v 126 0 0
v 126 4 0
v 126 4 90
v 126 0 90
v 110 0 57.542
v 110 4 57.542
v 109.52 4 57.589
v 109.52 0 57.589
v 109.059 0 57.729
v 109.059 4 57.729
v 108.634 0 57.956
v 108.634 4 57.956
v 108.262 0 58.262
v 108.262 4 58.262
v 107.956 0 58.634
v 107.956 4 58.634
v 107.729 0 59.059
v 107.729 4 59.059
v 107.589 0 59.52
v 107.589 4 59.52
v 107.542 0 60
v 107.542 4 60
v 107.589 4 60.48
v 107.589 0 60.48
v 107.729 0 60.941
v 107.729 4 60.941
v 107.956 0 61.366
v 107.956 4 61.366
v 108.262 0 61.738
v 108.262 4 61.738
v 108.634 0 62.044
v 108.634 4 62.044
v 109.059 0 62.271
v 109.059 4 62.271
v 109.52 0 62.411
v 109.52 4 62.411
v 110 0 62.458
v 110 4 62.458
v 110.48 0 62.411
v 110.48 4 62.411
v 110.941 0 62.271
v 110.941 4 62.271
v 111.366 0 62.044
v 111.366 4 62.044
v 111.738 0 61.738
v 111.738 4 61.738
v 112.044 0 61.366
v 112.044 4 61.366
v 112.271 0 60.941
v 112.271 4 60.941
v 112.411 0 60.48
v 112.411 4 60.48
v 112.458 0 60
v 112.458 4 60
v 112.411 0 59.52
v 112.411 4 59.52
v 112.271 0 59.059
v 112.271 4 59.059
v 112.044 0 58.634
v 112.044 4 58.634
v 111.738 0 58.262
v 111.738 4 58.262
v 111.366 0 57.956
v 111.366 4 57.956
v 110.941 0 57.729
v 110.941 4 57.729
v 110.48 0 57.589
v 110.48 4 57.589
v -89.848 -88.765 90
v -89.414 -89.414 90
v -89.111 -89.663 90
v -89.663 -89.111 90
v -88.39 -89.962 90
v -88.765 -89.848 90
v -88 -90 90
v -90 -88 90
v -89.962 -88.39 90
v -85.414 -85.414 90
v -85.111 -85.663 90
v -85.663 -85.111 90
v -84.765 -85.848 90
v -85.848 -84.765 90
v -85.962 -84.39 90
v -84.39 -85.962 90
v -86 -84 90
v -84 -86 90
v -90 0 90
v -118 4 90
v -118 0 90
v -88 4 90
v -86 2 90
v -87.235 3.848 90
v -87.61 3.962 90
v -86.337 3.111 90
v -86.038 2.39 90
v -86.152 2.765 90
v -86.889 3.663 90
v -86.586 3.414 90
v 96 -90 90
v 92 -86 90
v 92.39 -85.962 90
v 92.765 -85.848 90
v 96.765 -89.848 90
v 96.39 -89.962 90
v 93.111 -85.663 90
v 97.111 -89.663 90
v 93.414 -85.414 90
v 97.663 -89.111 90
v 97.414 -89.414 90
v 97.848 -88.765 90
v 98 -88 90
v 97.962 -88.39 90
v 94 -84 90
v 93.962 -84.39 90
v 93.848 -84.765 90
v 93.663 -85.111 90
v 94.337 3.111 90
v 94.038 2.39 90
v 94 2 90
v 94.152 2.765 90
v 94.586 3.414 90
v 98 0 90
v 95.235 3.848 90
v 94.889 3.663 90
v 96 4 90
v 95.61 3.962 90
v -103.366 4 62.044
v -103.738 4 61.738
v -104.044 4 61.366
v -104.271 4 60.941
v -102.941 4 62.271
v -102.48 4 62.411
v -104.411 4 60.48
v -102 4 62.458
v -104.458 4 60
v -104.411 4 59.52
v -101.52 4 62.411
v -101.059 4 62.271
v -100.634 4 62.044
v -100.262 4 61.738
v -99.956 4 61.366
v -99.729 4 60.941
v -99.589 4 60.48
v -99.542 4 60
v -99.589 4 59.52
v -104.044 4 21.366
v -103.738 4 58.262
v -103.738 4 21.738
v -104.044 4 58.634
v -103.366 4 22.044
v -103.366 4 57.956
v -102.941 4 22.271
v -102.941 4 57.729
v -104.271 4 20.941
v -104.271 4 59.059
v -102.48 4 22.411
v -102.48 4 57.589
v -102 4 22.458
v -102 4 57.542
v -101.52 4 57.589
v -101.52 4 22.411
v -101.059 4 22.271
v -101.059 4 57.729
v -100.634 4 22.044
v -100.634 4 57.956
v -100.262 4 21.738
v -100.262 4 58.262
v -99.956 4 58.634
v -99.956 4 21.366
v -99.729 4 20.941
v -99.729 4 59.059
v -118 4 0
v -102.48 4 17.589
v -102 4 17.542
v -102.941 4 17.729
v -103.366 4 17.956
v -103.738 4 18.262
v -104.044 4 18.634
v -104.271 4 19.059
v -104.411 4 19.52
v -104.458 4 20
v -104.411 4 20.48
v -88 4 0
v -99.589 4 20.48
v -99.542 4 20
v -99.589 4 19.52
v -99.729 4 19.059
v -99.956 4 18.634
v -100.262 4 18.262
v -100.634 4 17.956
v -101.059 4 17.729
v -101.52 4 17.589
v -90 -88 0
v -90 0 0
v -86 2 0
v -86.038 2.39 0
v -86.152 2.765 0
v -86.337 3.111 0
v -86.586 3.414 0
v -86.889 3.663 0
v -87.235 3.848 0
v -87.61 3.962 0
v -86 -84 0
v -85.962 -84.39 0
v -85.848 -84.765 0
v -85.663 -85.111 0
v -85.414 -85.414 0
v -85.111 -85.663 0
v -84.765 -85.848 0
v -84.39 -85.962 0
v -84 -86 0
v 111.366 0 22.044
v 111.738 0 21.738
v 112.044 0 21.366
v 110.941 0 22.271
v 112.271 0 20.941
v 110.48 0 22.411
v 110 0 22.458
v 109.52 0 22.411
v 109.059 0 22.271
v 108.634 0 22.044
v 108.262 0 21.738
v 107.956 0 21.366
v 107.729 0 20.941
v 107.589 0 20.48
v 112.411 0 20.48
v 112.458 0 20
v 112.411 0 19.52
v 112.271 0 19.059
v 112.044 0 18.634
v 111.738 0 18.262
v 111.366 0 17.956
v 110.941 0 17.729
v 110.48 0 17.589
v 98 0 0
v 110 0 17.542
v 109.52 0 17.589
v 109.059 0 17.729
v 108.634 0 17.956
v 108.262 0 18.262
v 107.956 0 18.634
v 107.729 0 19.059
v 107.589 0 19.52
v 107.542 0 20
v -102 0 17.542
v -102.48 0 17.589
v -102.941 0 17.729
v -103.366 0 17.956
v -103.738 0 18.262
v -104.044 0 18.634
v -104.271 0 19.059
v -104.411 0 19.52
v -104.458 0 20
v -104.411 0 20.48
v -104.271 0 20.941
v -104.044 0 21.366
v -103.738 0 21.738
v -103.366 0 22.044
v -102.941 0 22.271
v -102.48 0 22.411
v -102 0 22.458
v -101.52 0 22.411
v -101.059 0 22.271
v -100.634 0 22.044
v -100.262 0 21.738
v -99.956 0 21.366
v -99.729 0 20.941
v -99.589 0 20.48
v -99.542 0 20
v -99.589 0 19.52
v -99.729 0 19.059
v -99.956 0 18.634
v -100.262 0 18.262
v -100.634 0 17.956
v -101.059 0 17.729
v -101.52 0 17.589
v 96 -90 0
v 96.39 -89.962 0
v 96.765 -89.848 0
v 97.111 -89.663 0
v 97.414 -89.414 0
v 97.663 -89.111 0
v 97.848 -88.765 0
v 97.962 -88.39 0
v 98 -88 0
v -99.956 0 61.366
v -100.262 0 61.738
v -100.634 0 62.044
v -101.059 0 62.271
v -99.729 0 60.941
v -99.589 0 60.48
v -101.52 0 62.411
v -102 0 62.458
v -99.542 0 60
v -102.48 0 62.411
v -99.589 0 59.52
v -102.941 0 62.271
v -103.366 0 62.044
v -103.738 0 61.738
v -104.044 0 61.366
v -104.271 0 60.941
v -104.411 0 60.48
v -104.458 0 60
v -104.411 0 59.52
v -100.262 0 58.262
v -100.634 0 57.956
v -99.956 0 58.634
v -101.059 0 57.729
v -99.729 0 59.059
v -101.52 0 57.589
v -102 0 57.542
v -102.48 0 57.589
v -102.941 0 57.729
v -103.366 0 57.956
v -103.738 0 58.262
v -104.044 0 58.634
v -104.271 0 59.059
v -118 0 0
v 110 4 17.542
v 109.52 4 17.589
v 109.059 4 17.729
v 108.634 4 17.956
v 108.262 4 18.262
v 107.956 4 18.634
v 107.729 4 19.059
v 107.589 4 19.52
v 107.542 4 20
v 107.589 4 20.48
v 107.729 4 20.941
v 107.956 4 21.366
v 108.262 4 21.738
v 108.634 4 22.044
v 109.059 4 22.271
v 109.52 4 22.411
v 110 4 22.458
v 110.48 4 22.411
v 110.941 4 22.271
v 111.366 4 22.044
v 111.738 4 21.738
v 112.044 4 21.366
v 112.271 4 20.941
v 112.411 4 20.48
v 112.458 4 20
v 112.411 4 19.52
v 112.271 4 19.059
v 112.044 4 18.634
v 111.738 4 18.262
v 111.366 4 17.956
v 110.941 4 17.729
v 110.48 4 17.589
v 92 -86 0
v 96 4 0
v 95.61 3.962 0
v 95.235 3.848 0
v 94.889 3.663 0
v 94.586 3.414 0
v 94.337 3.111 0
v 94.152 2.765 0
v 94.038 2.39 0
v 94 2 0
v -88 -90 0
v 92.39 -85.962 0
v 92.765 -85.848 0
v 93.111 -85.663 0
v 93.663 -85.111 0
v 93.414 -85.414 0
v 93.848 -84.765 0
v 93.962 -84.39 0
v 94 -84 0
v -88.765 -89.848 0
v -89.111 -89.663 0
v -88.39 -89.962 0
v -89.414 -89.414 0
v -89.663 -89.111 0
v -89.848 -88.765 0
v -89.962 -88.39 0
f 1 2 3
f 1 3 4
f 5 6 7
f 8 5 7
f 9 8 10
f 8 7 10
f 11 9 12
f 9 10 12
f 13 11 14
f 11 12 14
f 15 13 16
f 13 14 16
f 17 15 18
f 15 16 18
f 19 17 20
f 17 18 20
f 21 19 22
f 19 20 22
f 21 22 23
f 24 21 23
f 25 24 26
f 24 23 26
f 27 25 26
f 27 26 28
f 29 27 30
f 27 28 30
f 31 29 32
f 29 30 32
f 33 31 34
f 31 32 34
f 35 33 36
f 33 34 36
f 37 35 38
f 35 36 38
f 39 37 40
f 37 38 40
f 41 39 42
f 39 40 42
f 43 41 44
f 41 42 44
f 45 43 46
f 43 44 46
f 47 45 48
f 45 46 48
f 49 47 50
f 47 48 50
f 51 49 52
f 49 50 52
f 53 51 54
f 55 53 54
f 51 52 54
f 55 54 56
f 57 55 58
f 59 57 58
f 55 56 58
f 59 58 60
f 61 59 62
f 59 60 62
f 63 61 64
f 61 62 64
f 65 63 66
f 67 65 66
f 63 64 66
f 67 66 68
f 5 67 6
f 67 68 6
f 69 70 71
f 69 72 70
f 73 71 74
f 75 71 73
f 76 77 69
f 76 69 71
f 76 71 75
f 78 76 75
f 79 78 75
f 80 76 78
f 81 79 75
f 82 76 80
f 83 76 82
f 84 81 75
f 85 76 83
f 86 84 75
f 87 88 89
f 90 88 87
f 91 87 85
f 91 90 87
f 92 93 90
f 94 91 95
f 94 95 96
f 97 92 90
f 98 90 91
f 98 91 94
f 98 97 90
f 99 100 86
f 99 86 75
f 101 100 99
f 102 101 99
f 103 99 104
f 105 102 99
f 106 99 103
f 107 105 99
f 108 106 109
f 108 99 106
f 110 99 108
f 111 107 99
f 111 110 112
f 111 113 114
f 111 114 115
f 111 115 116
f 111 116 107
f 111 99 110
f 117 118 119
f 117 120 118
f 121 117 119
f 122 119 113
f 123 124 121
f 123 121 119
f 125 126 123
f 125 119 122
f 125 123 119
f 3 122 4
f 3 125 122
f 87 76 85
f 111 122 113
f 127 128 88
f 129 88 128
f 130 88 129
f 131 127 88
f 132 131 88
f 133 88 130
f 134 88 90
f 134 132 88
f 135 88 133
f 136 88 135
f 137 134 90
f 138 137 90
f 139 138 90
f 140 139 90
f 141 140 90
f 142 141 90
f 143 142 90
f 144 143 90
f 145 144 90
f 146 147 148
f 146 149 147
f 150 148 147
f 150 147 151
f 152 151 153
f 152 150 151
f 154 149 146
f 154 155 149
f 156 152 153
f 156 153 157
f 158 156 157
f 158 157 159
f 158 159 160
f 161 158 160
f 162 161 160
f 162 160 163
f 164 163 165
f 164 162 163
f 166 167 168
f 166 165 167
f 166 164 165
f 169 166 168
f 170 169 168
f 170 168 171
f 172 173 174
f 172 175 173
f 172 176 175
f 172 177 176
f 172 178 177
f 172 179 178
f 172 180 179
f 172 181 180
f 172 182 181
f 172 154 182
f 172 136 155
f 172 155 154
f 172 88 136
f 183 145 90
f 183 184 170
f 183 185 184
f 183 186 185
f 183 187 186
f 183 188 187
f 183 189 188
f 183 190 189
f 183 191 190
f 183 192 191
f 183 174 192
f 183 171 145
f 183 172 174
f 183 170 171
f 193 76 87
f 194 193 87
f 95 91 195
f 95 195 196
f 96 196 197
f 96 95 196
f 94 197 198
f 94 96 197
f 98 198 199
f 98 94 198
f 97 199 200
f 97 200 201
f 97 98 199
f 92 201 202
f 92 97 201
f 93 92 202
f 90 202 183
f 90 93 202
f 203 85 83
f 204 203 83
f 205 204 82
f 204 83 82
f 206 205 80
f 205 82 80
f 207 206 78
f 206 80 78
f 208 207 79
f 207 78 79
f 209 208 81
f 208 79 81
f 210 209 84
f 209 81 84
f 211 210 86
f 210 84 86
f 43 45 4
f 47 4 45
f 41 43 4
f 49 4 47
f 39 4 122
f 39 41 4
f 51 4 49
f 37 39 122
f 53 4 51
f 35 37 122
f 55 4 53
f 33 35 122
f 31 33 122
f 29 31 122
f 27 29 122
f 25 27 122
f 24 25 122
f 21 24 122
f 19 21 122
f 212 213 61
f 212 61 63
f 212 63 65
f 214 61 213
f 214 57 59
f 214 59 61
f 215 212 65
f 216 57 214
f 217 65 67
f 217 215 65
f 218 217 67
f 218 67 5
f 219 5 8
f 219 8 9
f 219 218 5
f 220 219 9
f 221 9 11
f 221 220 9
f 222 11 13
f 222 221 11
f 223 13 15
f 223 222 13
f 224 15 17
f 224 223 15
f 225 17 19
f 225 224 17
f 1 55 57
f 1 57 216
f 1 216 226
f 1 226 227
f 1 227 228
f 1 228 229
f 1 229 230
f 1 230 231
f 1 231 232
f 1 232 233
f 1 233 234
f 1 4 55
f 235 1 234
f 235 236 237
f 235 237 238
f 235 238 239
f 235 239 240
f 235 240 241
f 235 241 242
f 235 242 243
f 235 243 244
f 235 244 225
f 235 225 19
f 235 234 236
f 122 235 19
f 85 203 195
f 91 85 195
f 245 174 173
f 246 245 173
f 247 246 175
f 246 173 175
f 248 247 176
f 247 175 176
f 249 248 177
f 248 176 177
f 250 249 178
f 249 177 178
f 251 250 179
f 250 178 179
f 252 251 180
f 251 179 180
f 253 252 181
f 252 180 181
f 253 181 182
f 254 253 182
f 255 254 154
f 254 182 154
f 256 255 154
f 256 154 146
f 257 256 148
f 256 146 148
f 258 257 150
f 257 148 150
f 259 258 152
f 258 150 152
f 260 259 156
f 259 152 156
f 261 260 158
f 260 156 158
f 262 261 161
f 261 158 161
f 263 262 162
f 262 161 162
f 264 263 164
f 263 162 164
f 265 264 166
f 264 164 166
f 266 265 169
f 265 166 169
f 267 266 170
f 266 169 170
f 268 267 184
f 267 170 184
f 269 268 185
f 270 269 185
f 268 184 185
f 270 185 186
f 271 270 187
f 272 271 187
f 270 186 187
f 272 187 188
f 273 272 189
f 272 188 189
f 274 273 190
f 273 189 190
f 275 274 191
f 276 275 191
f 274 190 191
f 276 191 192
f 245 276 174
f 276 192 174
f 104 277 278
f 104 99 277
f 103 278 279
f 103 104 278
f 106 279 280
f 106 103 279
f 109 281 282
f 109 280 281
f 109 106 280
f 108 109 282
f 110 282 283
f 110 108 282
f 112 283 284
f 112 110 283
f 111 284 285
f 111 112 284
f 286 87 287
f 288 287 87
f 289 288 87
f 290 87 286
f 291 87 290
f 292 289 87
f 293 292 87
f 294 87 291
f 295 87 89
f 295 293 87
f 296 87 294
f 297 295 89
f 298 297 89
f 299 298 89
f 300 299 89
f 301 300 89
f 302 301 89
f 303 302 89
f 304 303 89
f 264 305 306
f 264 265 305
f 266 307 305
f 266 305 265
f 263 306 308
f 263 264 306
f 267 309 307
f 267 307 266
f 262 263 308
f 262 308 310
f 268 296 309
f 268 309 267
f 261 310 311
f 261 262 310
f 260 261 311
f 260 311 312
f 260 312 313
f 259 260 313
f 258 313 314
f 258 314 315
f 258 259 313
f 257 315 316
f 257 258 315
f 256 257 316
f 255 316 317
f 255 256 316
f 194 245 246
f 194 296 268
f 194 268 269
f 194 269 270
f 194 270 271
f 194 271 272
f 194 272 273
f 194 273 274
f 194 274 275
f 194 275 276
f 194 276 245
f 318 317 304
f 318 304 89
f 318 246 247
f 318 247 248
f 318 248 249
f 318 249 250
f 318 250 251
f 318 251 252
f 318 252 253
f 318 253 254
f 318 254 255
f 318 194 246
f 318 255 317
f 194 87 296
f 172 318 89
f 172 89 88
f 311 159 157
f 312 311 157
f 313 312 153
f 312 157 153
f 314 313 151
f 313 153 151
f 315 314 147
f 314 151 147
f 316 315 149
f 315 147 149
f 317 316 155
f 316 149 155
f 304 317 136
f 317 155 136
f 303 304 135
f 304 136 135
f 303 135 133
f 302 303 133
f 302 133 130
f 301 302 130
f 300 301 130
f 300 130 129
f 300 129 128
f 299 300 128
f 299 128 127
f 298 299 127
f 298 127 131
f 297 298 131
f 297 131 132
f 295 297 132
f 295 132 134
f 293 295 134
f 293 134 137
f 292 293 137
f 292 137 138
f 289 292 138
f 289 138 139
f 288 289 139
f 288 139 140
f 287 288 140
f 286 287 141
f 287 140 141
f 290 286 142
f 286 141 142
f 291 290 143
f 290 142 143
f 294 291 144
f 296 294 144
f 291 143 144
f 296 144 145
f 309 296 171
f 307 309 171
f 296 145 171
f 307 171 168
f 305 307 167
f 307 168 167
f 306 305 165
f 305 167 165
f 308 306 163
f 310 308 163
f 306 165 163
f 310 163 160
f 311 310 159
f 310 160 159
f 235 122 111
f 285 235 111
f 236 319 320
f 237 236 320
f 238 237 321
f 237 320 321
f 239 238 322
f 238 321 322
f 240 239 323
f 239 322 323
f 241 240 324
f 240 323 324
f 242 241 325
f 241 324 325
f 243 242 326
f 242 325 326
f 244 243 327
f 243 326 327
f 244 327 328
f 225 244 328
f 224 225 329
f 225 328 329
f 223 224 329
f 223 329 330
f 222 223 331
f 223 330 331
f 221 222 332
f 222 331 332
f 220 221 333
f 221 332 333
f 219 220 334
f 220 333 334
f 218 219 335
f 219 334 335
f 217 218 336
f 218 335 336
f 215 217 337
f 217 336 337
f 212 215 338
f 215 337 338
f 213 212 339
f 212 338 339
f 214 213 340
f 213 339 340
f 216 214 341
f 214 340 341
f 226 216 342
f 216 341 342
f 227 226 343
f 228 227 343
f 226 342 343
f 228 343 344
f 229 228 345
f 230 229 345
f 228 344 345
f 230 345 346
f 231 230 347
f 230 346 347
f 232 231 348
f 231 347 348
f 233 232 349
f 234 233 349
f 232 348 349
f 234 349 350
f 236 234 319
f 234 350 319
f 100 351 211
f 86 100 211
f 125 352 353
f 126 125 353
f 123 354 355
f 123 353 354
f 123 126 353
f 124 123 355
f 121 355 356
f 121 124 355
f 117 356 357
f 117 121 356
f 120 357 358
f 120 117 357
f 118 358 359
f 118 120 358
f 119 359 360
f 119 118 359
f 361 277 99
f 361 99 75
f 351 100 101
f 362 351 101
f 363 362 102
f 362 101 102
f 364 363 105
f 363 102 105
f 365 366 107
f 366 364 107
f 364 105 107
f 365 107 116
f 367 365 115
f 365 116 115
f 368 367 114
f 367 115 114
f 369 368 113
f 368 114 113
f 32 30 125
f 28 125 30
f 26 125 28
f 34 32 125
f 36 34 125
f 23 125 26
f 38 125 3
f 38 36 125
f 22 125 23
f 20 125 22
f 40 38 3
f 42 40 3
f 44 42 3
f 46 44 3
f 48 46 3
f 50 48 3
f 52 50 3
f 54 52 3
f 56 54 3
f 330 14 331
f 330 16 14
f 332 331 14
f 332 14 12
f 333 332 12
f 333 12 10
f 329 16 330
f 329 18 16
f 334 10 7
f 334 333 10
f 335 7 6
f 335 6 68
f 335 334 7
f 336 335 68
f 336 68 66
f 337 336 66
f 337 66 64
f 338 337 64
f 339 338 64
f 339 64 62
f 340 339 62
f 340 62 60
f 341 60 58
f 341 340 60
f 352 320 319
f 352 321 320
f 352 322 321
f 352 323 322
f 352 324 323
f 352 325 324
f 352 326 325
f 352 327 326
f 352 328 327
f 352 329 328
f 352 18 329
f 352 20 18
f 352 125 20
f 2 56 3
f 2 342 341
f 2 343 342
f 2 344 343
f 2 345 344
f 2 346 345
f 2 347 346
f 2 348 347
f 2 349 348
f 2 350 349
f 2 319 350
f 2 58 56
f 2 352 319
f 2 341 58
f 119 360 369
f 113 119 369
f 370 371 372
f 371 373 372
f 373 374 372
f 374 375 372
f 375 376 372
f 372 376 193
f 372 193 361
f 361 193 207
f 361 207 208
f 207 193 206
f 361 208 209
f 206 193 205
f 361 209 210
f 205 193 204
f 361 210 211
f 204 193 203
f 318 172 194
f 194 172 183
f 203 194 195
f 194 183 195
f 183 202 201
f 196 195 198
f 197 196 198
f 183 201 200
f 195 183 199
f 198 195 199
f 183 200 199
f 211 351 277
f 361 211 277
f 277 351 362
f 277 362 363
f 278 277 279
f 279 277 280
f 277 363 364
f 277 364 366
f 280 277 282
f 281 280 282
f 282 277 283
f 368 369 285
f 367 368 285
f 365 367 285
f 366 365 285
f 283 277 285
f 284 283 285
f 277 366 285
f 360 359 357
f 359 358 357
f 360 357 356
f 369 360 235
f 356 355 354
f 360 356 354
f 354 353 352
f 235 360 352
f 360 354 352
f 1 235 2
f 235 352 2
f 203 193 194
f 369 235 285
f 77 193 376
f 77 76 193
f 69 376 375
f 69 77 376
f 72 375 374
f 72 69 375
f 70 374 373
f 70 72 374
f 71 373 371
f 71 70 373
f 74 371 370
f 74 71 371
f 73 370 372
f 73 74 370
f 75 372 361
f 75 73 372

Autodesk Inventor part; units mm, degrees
ref_plane "YZ Plane" through (0, 0, 0) normal (1, 0, 0) x (0, 1, 0)
ref_plane "XZ Plane" through (0, 0, 0) normal (0, 1, 0) x (-1, 0, 0)
ref_plane "XY Plane" through (0, 0, 0) normal (0, 0, 1) x (1, 0, 0)
sketch "Sketch1" plane through (0, 0, 0) normal (0, 0, 1) x (1, 0, 0)
  line L0 (98, 0) -> (98, -90)
  line L1 (98, -90) -> (-90, -90)
  line L2 (-90, -90) -> (-90, 0)
  line L3 (126, 4) -> (126, 0)
  line L4 (126, 0) -> (-118, 0)
  line L5 (-118, 0) -> (-118, 4)
  line L6 (-86, 4) -> (94, 4)
  line L7 (94, 4) -> (94, -86)
  line L8 (94, -86) -> (-86, -86)
  line L9 (-86, -86) -> (-86, 4)
  line L10 (-90, 0) -> (-86, 0)
  line L11 (94, 0) -> (98, 0)
  line L12 (-118, 4) -> (-86, 4)
  line L13 (94, 4) -> (126, 4)
  point P0 (0, 0)
  point P1 (6, -4)
  point P2 (126, 2)
  point P3 (98, 0)
  point P4 (-118, 2)
  dimension "d0" = 188
  dimension "d1" = 90
  dimension "d3" = 90
  dimension "d4" = 244
  dimension "d5" = 120
  dimension "d8" = 90
  dimension "d9" = 180
  dimension "d10" = 4
  dimension "d13" = 0
  dimension "d14" = 4
  dimension "d72" = 32
extrude "Extrusion1" add sketch "Sketch1" along normal blind 90 contours L4 L7 L13 L3 | L0 L1 L2 L4 L9 L8 L7 | L4 L5 L12 L9
fillet "Fillet1" radius 2 4 edges at (-86, -86, 45) (-86, 4, 45) (94, 4, 45) (98, -90, 45)
fillet "Fillet2" radius 2 2 edges at (-90, -90, 45) (94, -86, 45)
sketch "Sketch7" plane through (-118, 0, 0) normal (0, -1, 0) x (1, 0, 0)
  line L0 (0, 0) -> (0, 90) projected
  line L1 (0, 0) -> (28, 0) projected
  line L2 (244, 0) -> (244, 90) projected
  line L3 (216, 0) -> (244, 0) projected
  point P0 (118, 0)
  point P1 (16, 20)
  point P2 (16, 60)
  point P3 (228, 20)
  point P4 (228, 60)
  dimension "d73" = 16
  dimension "d74" = 16
  dimension "d75" = 20
  dimension "d76" = 40
  dimension "d77" = 16
  dimension "d78" = 16
  dimension "d79" = 20
  dimension "d80" = 40
hole "Hole6" at (-102, 0, 20) at (-102, 0, 60) at (110, 0, 20) at (110, 0, 60) direction (0, 1, 0) diameter 4.917 end through all thread size "M6x1" class "6H" standard "ISO Metric profile"
equation "\"d86\" = Thickness"
equation "\"BendRadius\" = Thickness"
equation "\"BendReliefWidth\" = Thickness"
equation "\"BendReliefDepth\" = 0.5 * Thickness"
equation "\"CornerReliefSize\" = 4 * Thickness"
equation "\"MinimumRemnant\" = 2 * Thickness"
equation "\"TransitionRadius\" = BendRadius"
equation "\"JacobiRadiusSize\" = BendRadius"
equation "\"GapSize\" = Thickness"
equation "\"Thickness\" = 0.5"
properties part number "Top joint housing"
